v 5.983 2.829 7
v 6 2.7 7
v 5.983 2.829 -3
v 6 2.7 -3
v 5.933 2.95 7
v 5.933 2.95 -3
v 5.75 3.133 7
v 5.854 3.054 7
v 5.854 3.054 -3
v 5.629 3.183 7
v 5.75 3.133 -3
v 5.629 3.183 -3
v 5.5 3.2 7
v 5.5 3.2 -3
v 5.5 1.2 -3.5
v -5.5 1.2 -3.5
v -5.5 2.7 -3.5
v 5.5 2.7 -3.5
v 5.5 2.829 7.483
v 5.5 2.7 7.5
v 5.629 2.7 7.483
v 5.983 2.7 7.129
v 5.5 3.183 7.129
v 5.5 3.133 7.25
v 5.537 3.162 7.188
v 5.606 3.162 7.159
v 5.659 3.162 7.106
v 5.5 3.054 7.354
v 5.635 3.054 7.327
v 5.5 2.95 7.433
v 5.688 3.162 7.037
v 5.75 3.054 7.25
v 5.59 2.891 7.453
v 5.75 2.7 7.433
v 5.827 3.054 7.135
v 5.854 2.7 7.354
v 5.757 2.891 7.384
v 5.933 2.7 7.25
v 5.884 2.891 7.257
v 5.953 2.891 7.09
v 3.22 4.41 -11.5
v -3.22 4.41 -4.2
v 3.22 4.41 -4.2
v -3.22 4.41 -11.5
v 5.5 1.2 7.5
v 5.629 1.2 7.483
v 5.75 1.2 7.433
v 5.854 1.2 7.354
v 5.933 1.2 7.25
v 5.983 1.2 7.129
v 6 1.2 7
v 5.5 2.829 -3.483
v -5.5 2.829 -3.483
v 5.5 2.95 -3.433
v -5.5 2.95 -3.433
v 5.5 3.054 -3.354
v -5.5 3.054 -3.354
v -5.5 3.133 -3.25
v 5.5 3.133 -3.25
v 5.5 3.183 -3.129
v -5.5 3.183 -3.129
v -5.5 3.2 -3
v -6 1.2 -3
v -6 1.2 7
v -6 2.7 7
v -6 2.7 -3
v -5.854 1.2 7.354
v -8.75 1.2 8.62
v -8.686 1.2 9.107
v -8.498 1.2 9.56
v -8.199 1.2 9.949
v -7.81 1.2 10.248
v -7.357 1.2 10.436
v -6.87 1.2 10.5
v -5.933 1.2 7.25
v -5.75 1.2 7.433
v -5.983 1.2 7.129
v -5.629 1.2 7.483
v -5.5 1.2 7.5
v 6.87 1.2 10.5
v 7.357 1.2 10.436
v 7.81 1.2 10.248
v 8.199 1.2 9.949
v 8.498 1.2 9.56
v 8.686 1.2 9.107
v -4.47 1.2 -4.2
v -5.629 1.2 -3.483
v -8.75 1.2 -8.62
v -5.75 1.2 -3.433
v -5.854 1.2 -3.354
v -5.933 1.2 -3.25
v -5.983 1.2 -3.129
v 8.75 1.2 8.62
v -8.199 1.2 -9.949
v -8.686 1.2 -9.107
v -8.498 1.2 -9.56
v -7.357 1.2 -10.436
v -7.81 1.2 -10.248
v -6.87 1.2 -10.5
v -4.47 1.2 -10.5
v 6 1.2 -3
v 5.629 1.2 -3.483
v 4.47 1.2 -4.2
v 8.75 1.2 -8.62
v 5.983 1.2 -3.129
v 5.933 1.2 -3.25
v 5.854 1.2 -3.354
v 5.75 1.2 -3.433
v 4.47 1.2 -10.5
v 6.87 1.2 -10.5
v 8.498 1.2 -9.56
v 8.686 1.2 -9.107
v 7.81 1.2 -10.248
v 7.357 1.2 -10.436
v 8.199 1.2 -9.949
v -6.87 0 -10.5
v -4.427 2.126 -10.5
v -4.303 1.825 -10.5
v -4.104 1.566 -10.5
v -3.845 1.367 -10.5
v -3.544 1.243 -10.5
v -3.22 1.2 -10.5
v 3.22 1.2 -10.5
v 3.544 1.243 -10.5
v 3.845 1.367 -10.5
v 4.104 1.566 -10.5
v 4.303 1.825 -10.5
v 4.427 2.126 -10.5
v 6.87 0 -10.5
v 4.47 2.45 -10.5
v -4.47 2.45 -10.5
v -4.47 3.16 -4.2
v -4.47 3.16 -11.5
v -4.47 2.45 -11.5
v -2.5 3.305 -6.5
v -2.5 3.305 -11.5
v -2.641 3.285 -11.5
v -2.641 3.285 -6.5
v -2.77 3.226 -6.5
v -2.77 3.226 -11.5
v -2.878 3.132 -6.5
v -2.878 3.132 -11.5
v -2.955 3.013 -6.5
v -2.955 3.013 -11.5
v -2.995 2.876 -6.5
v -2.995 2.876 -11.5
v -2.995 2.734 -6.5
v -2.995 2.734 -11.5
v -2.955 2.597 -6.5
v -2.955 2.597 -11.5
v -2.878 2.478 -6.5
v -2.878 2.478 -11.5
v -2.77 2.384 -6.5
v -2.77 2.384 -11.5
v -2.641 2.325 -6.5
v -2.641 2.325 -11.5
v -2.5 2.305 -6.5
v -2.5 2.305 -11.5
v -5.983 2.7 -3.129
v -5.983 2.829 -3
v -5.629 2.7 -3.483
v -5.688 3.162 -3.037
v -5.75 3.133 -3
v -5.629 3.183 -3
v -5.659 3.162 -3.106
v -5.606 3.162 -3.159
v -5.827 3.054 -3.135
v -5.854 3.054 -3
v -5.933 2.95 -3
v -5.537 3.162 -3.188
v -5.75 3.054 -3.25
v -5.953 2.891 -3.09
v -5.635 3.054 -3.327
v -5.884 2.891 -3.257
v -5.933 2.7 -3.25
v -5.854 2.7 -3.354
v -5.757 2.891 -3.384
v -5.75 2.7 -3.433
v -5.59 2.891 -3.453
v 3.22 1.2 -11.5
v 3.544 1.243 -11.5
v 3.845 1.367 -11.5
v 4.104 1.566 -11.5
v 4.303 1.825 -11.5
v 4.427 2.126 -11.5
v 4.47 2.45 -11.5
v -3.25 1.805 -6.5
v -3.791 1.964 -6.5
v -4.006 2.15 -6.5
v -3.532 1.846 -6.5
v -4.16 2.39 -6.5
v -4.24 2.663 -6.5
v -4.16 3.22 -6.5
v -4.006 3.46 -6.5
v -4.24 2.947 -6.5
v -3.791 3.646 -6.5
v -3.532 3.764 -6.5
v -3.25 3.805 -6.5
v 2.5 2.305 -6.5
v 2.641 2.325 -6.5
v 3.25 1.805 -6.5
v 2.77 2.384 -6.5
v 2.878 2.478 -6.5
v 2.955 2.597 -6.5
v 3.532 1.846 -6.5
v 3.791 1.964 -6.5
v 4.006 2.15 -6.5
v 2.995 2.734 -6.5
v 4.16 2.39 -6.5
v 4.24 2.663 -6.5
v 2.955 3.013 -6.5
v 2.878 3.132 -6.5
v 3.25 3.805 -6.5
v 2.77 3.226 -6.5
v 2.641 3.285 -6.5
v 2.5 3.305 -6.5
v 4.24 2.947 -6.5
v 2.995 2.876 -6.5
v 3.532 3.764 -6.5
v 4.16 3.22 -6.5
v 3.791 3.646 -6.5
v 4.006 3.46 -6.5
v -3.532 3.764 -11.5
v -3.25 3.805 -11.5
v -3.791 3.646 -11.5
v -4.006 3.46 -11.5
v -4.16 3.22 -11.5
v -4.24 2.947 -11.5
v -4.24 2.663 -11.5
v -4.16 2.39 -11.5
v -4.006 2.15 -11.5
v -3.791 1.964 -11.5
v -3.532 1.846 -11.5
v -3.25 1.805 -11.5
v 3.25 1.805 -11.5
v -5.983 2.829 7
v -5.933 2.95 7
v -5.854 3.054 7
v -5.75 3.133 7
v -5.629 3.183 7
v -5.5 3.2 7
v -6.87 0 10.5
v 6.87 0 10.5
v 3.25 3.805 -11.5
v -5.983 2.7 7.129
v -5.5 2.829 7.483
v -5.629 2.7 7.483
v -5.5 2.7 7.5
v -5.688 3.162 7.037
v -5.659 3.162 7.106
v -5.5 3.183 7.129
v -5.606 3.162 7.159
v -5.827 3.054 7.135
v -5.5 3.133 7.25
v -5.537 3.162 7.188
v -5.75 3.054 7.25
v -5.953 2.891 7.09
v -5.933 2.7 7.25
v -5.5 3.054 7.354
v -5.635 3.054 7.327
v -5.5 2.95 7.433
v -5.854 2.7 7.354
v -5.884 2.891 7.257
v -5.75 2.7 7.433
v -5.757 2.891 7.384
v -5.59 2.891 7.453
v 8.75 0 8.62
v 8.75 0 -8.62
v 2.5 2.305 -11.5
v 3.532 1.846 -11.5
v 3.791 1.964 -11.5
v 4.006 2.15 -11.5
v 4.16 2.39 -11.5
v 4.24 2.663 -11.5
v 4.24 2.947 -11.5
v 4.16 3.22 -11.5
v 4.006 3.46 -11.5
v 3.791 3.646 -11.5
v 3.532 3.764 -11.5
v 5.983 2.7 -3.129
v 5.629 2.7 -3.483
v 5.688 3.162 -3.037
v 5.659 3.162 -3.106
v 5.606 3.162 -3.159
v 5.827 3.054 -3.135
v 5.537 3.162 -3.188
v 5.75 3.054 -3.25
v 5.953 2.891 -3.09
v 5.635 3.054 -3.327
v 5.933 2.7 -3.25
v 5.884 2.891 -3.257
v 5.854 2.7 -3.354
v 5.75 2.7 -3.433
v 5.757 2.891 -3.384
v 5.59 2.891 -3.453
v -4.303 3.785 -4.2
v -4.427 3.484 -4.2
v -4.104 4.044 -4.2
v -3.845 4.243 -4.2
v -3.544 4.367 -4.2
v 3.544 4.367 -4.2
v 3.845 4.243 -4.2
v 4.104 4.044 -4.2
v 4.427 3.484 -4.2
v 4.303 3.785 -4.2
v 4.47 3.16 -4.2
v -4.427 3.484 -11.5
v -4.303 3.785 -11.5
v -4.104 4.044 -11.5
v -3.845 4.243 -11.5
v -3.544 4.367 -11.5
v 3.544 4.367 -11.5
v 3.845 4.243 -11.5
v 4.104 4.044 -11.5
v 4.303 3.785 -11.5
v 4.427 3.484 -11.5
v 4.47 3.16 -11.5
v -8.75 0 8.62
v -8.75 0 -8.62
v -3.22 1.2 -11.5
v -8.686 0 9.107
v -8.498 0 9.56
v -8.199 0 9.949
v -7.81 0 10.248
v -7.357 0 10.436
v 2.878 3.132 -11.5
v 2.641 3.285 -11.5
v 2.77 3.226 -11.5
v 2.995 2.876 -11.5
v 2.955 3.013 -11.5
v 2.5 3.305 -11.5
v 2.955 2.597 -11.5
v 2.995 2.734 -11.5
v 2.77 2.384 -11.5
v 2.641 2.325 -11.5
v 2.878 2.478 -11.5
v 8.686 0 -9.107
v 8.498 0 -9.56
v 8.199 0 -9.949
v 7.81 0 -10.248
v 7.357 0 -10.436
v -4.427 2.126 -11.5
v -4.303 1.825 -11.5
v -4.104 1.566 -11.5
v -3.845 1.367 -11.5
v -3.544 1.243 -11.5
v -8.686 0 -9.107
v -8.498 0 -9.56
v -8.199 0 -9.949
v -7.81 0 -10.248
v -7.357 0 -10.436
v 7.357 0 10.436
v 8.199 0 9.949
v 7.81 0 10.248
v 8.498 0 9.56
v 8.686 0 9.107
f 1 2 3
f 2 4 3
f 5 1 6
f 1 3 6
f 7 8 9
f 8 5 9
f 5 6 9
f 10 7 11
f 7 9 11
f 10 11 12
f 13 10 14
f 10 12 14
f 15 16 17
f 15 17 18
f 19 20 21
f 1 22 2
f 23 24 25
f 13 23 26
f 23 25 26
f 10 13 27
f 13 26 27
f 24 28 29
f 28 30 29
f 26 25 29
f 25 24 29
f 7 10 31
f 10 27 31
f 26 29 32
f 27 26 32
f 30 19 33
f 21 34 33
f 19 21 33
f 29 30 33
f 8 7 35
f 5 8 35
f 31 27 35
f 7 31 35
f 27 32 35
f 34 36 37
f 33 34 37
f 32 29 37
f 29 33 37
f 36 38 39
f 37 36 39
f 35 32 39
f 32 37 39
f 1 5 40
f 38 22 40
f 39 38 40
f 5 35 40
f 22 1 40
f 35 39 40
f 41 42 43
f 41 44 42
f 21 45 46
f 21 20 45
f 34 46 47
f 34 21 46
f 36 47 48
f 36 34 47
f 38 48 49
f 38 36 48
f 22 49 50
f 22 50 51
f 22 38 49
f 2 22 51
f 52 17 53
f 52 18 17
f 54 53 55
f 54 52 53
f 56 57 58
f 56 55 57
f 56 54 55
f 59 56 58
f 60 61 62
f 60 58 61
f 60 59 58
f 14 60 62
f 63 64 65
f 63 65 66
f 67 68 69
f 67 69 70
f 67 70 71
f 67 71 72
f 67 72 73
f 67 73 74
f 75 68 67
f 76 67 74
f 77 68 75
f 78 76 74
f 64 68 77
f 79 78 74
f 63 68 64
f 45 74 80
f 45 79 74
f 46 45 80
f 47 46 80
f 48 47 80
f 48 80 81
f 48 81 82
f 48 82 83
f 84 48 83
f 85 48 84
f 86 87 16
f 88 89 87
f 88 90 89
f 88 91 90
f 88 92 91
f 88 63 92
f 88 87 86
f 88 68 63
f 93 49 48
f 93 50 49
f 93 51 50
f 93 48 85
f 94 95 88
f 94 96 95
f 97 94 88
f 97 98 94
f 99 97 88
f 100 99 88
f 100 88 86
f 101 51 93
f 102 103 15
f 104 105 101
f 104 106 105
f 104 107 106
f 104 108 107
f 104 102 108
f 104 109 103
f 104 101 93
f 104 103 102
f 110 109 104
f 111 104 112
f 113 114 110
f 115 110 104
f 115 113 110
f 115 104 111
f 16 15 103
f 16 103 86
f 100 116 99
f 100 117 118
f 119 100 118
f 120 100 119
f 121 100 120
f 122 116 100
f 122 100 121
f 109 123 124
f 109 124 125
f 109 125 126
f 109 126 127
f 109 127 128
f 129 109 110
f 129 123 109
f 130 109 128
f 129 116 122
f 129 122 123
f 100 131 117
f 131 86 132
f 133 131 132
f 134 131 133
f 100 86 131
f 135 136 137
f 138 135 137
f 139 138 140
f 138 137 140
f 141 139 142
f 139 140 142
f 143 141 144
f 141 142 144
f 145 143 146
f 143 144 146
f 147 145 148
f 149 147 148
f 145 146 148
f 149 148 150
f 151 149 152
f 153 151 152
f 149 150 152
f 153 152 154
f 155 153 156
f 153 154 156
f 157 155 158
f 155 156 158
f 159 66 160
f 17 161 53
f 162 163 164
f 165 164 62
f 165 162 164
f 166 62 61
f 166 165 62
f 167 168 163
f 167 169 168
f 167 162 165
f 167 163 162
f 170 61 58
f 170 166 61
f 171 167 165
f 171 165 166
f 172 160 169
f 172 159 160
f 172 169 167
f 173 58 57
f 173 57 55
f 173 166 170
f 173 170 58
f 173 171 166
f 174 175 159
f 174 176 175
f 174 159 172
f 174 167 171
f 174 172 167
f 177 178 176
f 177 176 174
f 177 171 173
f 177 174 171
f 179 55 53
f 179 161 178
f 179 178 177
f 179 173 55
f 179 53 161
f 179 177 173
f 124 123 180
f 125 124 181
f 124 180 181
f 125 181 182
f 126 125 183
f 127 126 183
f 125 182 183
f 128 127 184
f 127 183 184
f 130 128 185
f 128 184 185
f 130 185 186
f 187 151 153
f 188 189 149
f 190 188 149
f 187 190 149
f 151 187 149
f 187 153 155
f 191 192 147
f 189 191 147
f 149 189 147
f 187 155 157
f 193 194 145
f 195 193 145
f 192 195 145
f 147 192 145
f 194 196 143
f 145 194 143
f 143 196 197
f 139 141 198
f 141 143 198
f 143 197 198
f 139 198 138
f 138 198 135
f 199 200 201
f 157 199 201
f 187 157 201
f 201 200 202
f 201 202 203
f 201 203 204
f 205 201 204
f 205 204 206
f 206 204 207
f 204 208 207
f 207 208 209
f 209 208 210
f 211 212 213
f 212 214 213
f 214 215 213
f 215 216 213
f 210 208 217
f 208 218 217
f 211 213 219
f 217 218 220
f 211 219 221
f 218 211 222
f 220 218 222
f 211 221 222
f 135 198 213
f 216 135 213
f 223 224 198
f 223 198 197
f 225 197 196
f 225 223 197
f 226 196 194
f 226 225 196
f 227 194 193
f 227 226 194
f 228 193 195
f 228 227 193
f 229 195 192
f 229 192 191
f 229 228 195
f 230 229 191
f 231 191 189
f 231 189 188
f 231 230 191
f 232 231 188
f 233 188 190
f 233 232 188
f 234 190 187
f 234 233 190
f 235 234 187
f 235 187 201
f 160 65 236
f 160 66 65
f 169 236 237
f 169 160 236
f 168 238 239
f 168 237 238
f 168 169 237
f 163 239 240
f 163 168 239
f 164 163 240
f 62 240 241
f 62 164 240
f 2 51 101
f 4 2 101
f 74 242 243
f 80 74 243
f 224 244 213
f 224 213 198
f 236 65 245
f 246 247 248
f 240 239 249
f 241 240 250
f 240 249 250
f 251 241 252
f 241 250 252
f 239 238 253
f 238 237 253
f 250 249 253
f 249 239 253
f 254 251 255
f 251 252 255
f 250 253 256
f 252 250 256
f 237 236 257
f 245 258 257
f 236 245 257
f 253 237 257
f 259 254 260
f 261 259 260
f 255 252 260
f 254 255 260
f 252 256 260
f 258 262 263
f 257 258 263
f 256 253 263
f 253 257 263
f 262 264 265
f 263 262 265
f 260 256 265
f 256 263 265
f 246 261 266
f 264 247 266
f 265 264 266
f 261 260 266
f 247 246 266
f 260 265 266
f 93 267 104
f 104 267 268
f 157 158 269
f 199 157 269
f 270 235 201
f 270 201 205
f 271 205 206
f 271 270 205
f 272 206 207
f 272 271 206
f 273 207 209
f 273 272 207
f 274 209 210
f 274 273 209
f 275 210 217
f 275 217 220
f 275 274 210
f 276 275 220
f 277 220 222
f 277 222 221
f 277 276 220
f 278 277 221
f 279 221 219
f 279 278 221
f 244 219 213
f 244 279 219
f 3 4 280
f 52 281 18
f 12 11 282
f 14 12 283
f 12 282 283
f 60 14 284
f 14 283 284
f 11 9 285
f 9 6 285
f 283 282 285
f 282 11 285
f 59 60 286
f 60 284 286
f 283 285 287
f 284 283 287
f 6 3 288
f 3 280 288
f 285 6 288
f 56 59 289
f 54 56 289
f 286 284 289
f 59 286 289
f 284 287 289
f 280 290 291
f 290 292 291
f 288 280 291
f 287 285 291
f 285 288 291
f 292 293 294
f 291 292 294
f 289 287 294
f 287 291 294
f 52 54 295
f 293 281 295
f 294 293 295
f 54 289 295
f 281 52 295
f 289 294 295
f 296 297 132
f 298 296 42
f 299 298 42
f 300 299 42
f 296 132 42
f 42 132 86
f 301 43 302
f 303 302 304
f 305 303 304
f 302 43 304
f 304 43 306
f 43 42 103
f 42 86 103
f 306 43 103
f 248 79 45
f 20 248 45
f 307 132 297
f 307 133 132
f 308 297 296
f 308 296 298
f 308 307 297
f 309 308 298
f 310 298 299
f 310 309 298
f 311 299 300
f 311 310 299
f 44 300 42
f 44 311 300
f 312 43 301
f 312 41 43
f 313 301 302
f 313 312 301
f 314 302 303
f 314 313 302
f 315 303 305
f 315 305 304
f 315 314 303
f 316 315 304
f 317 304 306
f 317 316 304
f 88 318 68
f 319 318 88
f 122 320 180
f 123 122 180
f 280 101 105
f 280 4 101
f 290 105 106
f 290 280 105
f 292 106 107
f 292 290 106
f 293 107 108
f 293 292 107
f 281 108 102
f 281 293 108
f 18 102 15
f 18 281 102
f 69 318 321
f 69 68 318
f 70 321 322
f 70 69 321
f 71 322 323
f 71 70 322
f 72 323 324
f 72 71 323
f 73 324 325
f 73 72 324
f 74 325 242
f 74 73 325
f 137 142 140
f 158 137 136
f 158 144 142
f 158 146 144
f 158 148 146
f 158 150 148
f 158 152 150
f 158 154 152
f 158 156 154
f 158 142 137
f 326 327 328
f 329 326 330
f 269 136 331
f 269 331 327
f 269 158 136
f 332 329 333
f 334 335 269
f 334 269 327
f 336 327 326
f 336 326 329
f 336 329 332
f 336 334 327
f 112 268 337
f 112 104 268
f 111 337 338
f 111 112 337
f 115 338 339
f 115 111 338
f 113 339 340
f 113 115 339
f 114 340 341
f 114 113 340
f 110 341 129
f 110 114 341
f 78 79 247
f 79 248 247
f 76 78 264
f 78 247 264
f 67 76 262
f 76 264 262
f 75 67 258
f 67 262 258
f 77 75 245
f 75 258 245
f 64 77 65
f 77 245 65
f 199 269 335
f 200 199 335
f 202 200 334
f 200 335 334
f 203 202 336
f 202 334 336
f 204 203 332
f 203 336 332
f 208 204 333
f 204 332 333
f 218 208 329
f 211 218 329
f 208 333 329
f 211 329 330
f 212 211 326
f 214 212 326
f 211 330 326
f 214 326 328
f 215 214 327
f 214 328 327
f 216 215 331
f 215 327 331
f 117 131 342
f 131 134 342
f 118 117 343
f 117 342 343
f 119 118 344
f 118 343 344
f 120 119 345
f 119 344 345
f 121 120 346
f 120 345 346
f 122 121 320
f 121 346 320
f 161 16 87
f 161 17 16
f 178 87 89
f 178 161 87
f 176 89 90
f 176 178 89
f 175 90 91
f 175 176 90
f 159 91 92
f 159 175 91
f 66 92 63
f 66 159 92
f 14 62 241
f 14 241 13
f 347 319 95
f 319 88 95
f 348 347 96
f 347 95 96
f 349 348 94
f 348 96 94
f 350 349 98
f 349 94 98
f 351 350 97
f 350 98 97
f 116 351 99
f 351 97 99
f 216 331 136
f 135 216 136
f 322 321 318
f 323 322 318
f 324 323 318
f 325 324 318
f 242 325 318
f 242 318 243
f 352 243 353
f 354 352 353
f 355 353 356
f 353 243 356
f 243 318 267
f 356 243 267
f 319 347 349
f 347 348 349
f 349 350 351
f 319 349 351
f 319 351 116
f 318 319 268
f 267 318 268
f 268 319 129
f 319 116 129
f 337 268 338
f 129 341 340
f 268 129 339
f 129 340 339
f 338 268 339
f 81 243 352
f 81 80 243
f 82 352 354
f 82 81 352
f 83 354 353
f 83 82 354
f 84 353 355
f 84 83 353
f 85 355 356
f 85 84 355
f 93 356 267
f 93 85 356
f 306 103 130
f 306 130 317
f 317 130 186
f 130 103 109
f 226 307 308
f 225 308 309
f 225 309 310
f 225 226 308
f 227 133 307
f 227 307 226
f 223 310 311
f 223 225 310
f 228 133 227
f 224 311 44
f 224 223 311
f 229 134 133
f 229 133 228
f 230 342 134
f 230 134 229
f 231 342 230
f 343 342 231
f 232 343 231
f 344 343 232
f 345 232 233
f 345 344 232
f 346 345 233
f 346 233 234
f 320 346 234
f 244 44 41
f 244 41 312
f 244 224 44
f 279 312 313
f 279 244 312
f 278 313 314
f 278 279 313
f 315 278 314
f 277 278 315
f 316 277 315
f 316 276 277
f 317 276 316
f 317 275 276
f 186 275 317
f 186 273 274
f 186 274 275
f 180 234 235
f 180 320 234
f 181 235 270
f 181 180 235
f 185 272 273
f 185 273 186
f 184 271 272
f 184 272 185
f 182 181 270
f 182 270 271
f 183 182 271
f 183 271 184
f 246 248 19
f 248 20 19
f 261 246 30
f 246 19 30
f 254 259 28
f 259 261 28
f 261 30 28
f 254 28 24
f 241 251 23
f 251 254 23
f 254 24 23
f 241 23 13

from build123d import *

# Parameters (mm, degrees)
SKETCH1_W           = 17.5
SKETCH1_H           = 21
BOSS_EXTRUDE1_DEPTH = 1.2
FILLET1_R           = 1.88
SKETCH2_W           = 12
SKETCH2_H           = 11
BOSS_EXTRUDE2_DEPTH = 2
FILLET2_R           = 0.5
SKETCH3_W           = 8.94
SKETCH3_H           = 7.3
BOSS_EXTRUDE3_DEPTH = 3.21
FILLET3_R           = 1.25
CUT_EXTRUDE1_DEPTH  = 5


with BuildPart() as part:
    # Sketch1 → Boss-Extrude1 (new body)
    with BuildSketch(Plane(origin=(0, 0, 0), x_dir=(1, 0, 0), z_dir=(0, 1, 0))):
        Rectangle(SKETCH1_W, SKETCH1_H)
    extrude(amount=BOSS_EXTRUDE1_DEPTH)

    # Fillet1
    fillet1_edges = [part.edges().sort_by_distance(p)[0] for p in [
        (-8.75, 0.6, -10.5),
        (8.75, 0.6, -10.5),
        (8.75, 0.6, 10.5),
        (-8.75, 0.6, 10.5),
    ]]
    fillet(fillet1_edges, radius=FILLET1_R)

    # Sketch2 → Boss-Extrude2 (add)
    with BuildSketch(Plane(origin=(0, 1.2, 0), x_dir=(1, 0, 0), z_dir=(0, 1, 0))):
        with Locations((0, -2)):
            Rectangle(SKETCH2_W, SKETCH2_H)
    extrude(amount=BOSS_EXTRUDE2_DEPTH)

    # Fillet2
    fillet2_edges = [part.edges().sort_by_distance(p)[0] for p in [
        (-6, 2.2, -3.5),
        (-6, 2.2, 7.5),
        (6, 2.2, 7.5),
        (6, 2.2, -3.5),
        (-6, 3.2, 2),
        (0, 3.2, 7.5),
        (6, 3.2, 2),
        (0, 3.2, -3.5),
    ]]
    fillet(fillet2_edges, radius=FILLET2_R)

    # Sketch3 → Boss-Extrude3 (add)
    with BuildSketch(Plane(origin=(0, 1.2, 0), x_dir=(1, 0, 0), z_dir=(0, 1, 0))):
        with Locations((0, 7.85)):
            Rectangle(SKETCH3_W, SKETCH3_H)
    extrude(amount=BOSS_EXTRUDE3_DEPTH)

    # Fillet3
    fillet3_edges = [part.edges().sort_by_distance(p)[0] for p in [
        (-4.47, 1.2, -11),
        (4.47, 1.2, -11),
        (-4.47, 4.41, -7.85),
        (4.47, 4.41, -7.85),
    ]]
    fillet(fillet3_edges, radius=FILLET3_R)

    # Sketch4 → Cut-Extrude1 (cut)
    with BuildSketch(Plane(origin=(0, 0, -11.5), x_dir=(-1, 0, 0), z_dir=(0, 0, -1))):
        with BuildLine():
            Line((-3.25, 3.805), (3.25, 3.805))
            ThreePointArc((3.25, 3.805), (4.25, 2.805), (3.25, 1.805))
            Line((3.25, 1.805), (-3.25, 1.805))
            ThreePointArc((-3.25, 1.805), (-4.25, 2.805), (-3.25, 3.805))
        make_face()
        with BuildLine():
            Line((-2.5, 3.305), (2.5, 3.305))
            ThreePointArc((2.5, 3.305), (3, 2.805), (2.5, 2.305))
            Line((2.5, 2.305), (-2.5, 2.305))
            ThreePointArc((-2.5, 2.305), (-3, 2.805), (-2.5, 3.305))
        make_face(mode=Mode.SUBTRACT)
    extrude(amount=-CUT_EXTRUDE1_DEPTH, mode=Mode.SUBTRACT)


solid = part.part
